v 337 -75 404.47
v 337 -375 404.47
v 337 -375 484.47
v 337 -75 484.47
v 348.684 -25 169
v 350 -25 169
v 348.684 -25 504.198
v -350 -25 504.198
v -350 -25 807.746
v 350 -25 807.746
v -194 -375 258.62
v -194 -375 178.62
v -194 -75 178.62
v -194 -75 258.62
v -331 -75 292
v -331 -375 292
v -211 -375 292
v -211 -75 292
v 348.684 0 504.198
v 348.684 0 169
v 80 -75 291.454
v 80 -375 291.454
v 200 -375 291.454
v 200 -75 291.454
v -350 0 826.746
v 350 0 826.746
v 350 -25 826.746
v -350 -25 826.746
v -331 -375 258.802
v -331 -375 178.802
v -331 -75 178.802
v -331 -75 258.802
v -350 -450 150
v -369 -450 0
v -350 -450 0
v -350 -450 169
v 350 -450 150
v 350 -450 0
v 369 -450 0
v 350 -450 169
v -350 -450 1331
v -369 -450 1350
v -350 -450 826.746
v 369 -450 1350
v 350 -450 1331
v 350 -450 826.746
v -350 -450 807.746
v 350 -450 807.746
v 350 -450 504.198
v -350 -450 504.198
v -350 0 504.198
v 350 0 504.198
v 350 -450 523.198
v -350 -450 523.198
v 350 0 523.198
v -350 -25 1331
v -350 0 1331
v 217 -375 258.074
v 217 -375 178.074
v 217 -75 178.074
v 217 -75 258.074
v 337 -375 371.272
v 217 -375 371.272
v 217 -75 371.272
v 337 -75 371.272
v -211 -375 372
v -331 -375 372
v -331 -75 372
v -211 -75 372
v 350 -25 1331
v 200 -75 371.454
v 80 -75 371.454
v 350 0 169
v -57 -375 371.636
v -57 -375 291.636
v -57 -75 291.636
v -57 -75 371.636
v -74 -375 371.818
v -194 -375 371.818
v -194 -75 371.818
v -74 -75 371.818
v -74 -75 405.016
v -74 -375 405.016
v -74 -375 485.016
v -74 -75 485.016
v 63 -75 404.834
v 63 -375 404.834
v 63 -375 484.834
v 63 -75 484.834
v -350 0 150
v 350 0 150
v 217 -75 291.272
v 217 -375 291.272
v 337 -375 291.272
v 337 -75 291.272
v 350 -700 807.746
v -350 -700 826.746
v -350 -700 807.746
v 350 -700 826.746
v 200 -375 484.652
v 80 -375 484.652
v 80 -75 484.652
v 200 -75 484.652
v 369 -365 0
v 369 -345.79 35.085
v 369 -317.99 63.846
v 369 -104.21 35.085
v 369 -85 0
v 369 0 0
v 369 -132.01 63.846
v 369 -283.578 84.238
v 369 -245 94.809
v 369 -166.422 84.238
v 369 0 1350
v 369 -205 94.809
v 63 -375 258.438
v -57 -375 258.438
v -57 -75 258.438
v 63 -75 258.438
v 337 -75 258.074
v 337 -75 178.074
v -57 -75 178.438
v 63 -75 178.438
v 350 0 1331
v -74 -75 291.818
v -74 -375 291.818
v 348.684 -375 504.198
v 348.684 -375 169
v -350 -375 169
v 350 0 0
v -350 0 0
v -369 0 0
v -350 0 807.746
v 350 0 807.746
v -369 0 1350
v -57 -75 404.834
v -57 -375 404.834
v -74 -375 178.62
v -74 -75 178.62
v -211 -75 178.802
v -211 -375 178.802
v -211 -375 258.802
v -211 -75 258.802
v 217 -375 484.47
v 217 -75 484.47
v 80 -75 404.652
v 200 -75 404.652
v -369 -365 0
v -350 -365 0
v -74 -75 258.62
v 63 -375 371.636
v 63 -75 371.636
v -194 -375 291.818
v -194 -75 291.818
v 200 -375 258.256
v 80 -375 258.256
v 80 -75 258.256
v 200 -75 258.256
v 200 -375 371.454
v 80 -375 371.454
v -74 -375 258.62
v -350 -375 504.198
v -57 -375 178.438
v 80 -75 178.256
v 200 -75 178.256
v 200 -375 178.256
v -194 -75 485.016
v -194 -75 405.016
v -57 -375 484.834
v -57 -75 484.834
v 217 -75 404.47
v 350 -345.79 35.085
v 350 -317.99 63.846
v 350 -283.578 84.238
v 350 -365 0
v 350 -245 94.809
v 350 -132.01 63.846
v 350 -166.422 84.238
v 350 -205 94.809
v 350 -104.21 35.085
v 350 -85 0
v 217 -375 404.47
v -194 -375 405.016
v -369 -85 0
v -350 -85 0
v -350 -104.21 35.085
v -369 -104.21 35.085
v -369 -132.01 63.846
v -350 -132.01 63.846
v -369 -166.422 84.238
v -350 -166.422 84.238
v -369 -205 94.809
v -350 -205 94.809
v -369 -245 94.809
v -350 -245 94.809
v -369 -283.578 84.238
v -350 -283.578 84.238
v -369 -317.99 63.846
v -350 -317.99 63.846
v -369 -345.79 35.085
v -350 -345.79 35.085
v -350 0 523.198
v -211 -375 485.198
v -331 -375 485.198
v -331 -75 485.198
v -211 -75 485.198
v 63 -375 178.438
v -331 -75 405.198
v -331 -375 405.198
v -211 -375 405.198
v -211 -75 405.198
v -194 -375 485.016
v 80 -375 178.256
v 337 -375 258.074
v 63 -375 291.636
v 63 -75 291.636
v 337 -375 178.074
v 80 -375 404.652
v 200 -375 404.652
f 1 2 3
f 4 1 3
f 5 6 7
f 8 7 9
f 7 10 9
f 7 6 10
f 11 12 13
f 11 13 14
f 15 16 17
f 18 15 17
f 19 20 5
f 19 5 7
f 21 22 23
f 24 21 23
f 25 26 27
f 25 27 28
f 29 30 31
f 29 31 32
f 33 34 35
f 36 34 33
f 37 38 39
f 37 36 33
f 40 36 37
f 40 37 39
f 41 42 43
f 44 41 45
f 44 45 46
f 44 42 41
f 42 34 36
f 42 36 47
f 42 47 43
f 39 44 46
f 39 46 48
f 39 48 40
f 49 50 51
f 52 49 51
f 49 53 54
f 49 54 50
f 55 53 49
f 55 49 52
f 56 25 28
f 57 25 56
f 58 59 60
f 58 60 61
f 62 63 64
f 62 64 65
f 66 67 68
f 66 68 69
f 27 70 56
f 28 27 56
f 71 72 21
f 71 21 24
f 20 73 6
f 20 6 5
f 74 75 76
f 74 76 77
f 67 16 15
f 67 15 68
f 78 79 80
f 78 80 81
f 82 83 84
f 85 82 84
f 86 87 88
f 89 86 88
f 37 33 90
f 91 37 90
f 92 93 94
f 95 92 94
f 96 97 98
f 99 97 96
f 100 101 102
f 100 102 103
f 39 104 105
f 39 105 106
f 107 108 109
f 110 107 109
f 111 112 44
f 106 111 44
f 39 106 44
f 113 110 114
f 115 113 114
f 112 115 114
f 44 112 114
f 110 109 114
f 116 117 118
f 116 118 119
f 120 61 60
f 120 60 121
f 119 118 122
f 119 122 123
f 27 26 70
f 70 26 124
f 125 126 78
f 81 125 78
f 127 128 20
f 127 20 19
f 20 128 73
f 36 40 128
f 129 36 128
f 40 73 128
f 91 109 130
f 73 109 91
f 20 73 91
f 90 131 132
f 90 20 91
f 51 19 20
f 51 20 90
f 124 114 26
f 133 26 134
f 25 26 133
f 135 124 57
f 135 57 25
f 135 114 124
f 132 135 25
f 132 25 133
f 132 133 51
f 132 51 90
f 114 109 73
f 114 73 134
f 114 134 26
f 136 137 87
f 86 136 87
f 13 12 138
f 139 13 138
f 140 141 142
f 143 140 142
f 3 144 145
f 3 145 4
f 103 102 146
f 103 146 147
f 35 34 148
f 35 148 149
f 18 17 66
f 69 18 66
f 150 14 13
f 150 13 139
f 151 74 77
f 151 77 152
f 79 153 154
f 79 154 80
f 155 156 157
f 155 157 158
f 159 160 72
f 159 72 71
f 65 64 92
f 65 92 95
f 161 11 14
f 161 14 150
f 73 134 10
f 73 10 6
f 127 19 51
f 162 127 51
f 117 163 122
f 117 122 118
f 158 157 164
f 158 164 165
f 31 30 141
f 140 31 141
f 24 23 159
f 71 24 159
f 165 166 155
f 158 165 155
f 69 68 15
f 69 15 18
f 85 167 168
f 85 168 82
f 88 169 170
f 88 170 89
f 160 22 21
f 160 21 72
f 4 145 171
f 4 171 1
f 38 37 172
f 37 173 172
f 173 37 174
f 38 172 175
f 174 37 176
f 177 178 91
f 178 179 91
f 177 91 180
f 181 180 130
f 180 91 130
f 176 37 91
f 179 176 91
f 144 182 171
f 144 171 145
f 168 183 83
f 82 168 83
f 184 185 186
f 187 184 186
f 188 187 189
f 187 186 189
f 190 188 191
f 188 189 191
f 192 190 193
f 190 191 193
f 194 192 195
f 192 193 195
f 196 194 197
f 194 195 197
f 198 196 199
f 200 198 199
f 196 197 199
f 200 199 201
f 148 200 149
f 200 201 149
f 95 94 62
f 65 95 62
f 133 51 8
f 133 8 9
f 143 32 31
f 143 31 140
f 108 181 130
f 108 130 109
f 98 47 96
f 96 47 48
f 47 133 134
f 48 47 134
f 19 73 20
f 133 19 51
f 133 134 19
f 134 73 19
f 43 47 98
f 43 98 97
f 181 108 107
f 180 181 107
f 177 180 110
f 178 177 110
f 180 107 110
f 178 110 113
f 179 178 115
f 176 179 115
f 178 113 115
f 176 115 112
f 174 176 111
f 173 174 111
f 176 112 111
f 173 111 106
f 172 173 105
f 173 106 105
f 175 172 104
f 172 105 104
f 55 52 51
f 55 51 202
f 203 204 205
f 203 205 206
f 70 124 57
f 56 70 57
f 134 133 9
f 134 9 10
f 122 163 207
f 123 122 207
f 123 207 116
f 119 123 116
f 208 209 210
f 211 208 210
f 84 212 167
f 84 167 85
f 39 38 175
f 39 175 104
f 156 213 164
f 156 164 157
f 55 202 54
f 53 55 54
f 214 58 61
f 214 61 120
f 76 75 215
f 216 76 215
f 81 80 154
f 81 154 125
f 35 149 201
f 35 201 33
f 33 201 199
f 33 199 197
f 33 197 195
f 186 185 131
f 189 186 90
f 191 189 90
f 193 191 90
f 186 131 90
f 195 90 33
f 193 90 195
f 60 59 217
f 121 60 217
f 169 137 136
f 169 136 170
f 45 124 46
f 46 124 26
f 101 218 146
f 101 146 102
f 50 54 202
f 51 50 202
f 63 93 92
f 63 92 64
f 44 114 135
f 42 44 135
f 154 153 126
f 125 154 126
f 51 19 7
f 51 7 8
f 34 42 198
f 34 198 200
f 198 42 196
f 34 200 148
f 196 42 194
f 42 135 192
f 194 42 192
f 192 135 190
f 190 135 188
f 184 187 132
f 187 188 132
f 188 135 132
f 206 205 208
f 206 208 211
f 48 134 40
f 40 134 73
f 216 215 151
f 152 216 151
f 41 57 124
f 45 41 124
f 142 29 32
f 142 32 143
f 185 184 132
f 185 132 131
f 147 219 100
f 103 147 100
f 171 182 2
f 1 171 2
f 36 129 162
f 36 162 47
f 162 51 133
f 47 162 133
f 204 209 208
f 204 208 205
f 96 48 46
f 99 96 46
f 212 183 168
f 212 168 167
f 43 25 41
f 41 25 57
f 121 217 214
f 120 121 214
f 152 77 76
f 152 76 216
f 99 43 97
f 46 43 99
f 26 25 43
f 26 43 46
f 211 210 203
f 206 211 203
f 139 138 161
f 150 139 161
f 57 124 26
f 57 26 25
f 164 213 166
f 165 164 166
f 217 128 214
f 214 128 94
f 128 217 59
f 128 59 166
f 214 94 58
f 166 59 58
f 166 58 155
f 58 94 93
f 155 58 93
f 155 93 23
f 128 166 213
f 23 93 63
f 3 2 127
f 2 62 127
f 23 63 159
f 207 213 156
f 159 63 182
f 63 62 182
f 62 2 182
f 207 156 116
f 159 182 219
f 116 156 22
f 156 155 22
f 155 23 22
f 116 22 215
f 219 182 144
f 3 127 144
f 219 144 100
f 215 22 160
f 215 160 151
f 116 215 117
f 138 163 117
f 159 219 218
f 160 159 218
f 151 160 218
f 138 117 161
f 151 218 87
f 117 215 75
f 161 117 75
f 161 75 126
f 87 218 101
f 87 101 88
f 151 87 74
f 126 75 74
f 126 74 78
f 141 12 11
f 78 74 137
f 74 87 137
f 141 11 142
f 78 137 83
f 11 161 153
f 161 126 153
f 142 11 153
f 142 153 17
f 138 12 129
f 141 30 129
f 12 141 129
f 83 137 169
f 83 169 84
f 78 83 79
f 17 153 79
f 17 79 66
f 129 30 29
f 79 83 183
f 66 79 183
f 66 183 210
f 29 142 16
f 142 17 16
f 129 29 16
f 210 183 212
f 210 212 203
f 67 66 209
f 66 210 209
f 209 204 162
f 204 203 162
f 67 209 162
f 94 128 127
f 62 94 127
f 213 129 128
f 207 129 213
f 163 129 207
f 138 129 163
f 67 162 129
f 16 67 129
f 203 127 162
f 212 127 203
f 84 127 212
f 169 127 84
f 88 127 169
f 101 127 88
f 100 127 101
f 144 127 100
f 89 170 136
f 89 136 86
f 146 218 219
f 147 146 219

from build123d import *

# Parameters (mm, degrees)
F0_W      = 700
F0_H      = 19
F1_DEPTH  = 450
F2_W      = 450
F2_H      = 19
F3_DEPTH  = 700
F4_W      = 698.6836850643
F4_H      = 335.1980355978
F5_DEPTH  = 375
F6_W      = 120
F6_H      = 80
F7_DEPTH  = 300
F9_DEPTH  = 738.001
F10_W     = 700
F10_H     = 504.2535300255
F11_DEPTH = 25
F13_DEPTH = 25
F15_DEPTH = 700
F16_W     = 700
F16_H     = 19
F17_DEPTH = 250


with BuildPart() as f1:
    # F0 (on Front) → F1 (new body)
    with BuildSketch(Plane.XZ):
        Polygon((-369, 1350), (-369, 0), (-350, 0), (-350, 1331), (-350, 1350), align=None)
        with Locations((0, 1340.5)):
            Rectangle(F0_W, F0_H)
        Polygon((350, 1350), (350, 1331), (350, 0), (369, 0), (369, 1350), align=None)
    extrude(amount=F1_DEPTH)

    # F2 (on face) → F3 (join, through all)
    with BuildSketch(Plane.YZ.offset(-350)):
        with Locations((-225, 817.2464699745)):
            Rectangle(F2_W, F2_H)
        with Locations((-225, 159.5)):
            Rectangle(F2_W, F2_H)
    extrude(amount=F3_DEPTH)

    # F4 (on face) → F5 (join)
    with BuildSketch(Plane(origin=(0, 0, 0), x_dir=(-1, 0, 0), z_dir=(0, 1, 0))):
        with Locations((0.6581574678, 336.5990177989)):
            Rectangle(F4_W, F4_H)
    extrude(amount=-F5_DEPTH)

    # F6 (on face) → F7 (cut)
    with BuildSketch(Plane.XZ.offset(375)):
        with Locations((-271, 445.1980355978)):
            Rectangle(F6_W, F6_H)
        with Locations((-134.0001210052, 445.0159493365)):
            Rectangle(F6_W, F6_H)
        with Locations((2.9997579896, 444.8338630752)):
            Rectangle(F6_W, F6_H)
        with Locations((139.9996369844, 444.6517768139)):
            Rectangle(F6_W, F6_H)
        with Locations((276.9995159793, 444.4696905526)):
            Rectangle(F6_W, F6_H)
        with Locations((-271, 332)):
            Rectangle(F6_W, F6_H)
        with Locations((-134.0001210052, 331.8179137387)):
            Rectangle(F6_W, F6_H)
        with Locations((2.9997579896, 331.6358274774)):
            Rectangle(F6_W, F6_H)
        with Locations((139.9996369844, 331.4537412161)):
            Rectangle(F6_W, F6_H)
        with Locations((276.9995159793, 331.2716549548)):
            Rectangle(F6_W, F6_H)
        with Locations((-271, 218.8019644022)):
            Rectangle(F6_W, F6_H)
        with Locations((-134.0001210052, 218.6198781409)):
            Rectangle(F6_W, F6_H)
        with Locations((2.9997579896, 218.4377918796)):
            Rectangle(F6_W, F6_H)
        with Locations((139.9996369844, 218.2557056183)):
            Rectangle(F6_W, F6_H)
        with Locations((276.9995159793, 218.073619357)):
            Rectangle(F6_W, F6_H)
    extrude(amount=-F7_DEPTH, mode=Mode.SUBTRACT)

    # F8 (on face) → F9 (cut, through all)
    with BuildSketch(Plane.YZ.offset(369)):
        with BuildLine():
            Line((-365, 0), (-85, 0))
            ThreePointArc((-85, 0), (-225, 96.1483519287), (-365, 0))
        make_face()
    extrude(amount=-F9_DEPTH, mode=Mode.SUBTRACT)

    # F16 (on face) → F17 (join)
    with BuildSketch(Plane.XZ.offset(450)):
        with Locations((0, 817.2464699745)):
            Rectangle(F16_W, F16_H)
    extrude(amount=F17_DEPTH)


with BuildPart() as f11:
    # F10 (on face) → F11 (new body)
    with BuildSketch(Plane(origin=(0, 0, 0), x_dir=(-1, 0, 0), z_dir=(0, 1, 0))):
        with Locations((0, 1078.8732349873)):
            Rectangle(F10_W, F10_H)
    extrude(amount=-F11_DEPTH)


with BuildPart() as f13:
    # F12 (on face) → F13 (new body)
    with BuildSketch(Plane(origin=(0, 0, 0), x_dir=(-1, 0, 0), z_dir=(0, 1, 0))):
        Polygon((350, 504.1980355978), (350, 807.7464699745), (-350, 807.7464699745), (-350, 169), (-348.6836850643, 169), (-348.6836850643, 504.1980355978), align=None)
    extrude(amount=-F13_DEPTH)


with BuildPart() as f15:
    # F14 (on face) → F15 (new body, through all)
    with BuildSketch(Plane.YZ.offset(-350)):
        Polygon((0, 504.1980355978), (0, 523.1980355978), (-450, 523.1980355978), (-450, 504.1980355978), (-375, 504.1980355978), align=None)
    extrude(amount=F15_DEPTH)


solid = Compound([f1.part, f11.part, f13.part, f15.part])
